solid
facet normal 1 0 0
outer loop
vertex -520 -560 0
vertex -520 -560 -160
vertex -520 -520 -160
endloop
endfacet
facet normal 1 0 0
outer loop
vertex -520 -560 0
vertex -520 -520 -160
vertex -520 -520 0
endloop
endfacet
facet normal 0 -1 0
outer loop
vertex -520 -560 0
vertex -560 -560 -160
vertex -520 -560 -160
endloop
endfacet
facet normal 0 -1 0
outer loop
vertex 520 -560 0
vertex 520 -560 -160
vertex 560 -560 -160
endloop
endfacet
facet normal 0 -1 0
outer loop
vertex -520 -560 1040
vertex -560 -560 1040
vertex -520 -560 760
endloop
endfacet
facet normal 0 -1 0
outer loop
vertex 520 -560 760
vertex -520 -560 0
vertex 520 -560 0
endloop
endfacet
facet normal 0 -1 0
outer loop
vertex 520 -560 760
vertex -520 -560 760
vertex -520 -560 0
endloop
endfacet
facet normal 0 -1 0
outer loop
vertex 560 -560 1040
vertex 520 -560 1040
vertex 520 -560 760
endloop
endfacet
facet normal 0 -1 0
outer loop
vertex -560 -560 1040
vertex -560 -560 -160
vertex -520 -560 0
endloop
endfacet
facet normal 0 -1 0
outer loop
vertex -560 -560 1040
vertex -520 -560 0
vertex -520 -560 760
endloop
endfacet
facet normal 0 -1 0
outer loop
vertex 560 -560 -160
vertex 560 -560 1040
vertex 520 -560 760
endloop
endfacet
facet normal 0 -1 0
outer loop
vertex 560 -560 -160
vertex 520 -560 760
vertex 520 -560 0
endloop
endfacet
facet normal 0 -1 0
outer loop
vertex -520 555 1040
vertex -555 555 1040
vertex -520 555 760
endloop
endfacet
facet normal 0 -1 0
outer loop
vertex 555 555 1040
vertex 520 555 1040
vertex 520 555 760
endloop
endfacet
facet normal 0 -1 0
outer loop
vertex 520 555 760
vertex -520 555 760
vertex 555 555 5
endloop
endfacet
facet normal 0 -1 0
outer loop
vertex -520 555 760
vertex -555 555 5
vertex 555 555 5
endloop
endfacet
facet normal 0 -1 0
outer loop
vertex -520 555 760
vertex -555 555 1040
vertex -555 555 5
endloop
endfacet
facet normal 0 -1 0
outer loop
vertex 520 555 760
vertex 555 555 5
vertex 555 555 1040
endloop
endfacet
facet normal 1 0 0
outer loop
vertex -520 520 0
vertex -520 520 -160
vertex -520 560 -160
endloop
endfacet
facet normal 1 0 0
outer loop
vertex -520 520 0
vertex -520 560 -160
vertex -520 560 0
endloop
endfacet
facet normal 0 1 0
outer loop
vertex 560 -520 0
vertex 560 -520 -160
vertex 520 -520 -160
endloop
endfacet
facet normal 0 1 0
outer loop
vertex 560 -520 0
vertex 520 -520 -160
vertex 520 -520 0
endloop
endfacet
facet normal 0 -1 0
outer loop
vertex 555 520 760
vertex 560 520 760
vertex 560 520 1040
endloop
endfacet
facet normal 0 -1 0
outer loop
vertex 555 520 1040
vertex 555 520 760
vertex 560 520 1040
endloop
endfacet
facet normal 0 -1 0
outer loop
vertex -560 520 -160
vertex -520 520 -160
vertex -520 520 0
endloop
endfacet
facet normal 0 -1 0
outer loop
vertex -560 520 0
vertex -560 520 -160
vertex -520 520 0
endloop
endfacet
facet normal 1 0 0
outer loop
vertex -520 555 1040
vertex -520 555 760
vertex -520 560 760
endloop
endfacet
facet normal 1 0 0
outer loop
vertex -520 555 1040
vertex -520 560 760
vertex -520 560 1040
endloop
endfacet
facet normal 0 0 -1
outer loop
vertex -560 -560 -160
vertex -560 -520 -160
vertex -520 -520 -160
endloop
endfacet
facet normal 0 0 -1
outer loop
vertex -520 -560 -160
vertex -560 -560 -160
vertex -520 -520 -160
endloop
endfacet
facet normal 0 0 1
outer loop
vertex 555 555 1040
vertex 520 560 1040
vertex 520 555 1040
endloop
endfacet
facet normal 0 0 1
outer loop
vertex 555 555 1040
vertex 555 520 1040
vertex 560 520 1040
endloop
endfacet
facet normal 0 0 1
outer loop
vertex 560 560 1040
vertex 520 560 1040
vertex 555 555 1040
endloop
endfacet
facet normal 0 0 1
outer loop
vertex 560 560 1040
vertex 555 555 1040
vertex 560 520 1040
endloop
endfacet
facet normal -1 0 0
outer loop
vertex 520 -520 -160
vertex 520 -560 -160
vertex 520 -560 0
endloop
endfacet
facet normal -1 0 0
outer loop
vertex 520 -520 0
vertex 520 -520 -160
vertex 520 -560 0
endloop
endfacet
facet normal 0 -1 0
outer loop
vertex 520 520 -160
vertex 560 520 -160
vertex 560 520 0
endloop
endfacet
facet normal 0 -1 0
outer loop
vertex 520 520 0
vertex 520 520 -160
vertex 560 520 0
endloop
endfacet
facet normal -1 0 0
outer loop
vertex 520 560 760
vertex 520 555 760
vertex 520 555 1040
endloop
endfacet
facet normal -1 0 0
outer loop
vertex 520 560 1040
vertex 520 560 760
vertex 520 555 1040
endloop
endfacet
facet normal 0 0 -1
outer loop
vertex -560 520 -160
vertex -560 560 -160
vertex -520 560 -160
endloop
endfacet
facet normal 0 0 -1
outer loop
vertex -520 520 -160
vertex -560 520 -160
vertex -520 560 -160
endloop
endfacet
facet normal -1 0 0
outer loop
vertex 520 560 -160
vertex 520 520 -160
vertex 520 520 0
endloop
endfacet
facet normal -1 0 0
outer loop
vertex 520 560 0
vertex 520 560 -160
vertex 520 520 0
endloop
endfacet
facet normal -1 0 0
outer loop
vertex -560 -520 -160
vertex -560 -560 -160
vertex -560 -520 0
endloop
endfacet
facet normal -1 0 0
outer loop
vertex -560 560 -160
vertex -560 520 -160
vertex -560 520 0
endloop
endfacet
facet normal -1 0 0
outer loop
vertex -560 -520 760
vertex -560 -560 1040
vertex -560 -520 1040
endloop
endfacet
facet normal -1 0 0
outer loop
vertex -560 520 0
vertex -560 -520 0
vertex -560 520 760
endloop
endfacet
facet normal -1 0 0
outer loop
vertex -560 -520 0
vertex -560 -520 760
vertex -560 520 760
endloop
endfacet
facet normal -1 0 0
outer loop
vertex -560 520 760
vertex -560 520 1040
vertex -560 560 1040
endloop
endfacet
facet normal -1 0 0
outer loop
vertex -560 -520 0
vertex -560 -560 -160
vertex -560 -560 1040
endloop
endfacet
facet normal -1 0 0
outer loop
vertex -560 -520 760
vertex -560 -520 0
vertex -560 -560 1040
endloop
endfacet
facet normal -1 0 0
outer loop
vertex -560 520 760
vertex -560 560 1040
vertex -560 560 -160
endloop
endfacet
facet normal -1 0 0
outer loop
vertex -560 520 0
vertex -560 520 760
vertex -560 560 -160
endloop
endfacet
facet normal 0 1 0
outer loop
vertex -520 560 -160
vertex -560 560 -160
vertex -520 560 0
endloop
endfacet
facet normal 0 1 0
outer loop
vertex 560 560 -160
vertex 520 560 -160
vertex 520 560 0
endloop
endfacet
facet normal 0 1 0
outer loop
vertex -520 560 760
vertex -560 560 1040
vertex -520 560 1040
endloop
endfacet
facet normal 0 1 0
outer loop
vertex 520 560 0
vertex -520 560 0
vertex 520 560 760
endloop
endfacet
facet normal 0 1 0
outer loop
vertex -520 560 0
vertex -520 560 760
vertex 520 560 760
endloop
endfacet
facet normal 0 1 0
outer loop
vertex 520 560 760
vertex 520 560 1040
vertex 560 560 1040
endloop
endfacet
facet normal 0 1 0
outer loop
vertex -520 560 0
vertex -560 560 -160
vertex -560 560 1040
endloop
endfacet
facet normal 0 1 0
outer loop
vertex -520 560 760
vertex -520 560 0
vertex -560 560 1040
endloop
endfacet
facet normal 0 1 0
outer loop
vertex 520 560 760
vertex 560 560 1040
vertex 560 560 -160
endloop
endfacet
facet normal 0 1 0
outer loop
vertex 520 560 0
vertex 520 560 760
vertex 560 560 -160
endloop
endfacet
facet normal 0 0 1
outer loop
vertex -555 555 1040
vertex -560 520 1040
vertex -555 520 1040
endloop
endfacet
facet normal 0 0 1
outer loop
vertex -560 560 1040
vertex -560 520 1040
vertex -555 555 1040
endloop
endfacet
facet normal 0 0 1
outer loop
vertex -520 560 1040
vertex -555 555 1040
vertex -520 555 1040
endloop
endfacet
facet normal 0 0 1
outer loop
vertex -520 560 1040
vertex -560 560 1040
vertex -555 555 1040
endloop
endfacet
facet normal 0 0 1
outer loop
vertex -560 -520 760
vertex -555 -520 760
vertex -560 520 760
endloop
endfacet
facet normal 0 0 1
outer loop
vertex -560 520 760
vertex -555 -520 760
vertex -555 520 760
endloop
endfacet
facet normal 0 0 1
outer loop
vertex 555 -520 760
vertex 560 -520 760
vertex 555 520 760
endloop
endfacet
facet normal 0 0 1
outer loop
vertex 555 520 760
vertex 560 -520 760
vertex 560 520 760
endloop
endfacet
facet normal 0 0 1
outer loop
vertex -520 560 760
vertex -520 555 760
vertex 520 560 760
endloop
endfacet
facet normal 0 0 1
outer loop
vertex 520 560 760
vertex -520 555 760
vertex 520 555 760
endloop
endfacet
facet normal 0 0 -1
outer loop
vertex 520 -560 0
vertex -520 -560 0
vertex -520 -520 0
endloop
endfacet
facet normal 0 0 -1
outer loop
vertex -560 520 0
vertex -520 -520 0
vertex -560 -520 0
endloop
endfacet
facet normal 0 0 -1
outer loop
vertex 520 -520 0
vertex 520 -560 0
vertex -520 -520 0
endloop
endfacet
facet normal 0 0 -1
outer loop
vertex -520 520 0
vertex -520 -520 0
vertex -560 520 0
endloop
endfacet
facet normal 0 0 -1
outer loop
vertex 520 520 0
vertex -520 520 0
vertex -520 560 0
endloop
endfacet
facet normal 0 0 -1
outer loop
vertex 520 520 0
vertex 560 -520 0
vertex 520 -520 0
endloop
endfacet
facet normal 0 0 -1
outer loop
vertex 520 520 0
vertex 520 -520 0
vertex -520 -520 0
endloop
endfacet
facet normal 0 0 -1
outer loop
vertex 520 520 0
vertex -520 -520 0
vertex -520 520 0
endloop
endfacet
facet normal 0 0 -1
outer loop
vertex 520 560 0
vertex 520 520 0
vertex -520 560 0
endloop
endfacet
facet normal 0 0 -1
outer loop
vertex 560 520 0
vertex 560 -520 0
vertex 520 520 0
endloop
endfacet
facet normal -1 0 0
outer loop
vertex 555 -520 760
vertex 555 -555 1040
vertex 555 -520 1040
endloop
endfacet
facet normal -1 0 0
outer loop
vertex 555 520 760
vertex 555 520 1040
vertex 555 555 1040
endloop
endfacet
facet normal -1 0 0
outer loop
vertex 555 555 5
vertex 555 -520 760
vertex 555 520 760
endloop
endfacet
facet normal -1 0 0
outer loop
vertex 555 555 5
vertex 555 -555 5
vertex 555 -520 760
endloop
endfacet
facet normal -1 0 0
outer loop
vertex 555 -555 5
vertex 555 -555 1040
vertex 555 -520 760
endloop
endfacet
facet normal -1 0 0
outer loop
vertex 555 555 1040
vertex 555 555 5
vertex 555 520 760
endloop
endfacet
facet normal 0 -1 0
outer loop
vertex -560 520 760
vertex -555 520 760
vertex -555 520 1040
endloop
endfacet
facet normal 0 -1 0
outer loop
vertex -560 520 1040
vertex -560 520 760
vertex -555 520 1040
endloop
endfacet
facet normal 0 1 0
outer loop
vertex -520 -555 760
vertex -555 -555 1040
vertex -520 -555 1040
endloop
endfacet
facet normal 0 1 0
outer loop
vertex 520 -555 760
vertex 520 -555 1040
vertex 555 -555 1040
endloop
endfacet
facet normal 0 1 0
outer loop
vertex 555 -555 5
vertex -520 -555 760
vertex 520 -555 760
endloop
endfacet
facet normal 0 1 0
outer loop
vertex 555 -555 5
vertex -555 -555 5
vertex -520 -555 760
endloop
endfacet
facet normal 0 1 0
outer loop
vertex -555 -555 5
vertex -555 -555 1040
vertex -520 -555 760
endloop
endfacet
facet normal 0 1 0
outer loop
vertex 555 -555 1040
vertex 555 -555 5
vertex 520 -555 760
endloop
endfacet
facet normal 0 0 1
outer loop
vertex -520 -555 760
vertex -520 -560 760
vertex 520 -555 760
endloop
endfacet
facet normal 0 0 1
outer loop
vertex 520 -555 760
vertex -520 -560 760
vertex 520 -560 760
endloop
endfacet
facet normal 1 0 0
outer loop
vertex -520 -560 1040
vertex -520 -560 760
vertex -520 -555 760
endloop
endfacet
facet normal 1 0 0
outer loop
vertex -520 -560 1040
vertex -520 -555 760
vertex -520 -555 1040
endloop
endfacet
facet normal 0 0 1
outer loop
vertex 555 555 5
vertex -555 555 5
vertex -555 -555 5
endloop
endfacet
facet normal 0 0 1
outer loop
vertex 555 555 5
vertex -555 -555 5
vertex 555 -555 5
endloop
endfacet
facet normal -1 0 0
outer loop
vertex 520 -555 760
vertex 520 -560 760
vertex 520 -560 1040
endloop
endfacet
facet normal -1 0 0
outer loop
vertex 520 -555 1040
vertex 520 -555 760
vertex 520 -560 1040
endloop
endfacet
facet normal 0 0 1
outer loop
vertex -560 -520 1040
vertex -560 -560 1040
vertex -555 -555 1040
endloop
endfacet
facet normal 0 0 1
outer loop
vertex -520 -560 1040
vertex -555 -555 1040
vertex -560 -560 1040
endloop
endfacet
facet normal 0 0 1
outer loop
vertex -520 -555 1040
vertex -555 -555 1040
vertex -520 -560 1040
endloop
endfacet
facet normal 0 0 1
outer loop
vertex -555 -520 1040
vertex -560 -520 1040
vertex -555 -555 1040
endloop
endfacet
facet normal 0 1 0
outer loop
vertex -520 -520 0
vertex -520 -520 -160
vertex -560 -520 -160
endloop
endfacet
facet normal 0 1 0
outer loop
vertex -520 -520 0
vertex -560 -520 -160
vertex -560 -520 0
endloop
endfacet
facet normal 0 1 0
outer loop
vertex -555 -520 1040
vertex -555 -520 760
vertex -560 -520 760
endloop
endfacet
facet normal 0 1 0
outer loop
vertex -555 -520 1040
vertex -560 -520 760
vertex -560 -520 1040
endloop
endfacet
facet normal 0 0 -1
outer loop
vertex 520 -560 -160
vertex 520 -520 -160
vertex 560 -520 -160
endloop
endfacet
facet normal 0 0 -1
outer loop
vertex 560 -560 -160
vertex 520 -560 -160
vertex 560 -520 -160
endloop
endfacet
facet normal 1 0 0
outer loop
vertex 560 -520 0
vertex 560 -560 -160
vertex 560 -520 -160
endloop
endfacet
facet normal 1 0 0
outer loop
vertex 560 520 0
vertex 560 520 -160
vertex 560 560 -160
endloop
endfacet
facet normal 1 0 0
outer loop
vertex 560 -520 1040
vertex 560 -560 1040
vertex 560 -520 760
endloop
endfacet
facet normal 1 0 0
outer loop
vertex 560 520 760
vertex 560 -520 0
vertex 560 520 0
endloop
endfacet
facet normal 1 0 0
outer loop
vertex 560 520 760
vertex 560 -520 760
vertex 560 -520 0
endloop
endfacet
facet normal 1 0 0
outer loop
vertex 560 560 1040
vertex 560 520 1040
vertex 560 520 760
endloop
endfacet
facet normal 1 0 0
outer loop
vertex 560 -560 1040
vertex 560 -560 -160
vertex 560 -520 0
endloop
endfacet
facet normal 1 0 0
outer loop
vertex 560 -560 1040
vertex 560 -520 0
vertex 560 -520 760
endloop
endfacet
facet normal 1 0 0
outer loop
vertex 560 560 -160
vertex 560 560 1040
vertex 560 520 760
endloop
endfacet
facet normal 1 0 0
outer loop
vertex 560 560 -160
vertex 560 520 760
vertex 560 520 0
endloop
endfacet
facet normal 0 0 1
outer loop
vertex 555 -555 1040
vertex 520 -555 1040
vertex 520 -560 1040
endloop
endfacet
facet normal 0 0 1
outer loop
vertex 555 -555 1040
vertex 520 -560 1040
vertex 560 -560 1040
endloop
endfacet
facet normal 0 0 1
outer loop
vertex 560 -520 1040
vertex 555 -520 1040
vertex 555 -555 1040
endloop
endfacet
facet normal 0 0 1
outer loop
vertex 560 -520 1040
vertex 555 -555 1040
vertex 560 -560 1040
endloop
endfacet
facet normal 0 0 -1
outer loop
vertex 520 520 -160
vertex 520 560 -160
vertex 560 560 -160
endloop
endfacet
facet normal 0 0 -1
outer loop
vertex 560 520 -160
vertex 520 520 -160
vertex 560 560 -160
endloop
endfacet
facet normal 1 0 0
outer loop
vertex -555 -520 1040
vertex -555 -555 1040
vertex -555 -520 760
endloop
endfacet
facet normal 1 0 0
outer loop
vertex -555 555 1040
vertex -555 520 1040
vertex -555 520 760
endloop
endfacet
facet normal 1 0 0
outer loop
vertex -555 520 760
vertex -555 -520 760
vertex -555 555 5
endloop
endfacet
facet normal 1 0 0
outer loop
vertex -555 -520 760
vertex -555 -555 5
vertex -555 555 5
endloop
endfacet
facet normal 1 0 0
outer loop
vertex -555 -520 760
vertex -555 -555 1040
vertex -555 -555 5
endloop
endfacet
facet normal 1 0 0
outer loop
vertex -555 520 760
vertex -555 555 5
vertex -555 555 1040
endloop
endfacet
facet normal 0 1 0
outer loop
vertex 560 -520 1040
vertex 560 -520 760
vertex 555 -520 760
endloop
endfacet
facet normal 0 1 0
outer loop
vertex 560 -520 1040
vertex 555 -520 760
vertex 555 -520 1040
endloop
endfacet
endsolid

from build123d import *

# Parameters (mm, degrees)
F0_W     = 1120
F0_H     = 1120
F1_DEPTH = 1040
F2_T     = -5
F3_DEPTH = 160
F4_W     = 1040
F4_H     = 280
F4_H_2   = 160
F5_DEPTH = 1120.001
F6_W     = 1040
F6_H     = 280
F6_H_2   = 160
F7_DEPTH = 1120.001


with BuildPart() as f1:
    # F0 (on Top) → F1 (new body)
    with BuildSketch(Plane.XY):
        Rectangle(F0_W, F0_H)
    extrude(amount=F1_DEPTH)

    # F2
    f2_openings = [f1.faces().sort_by_distance(p)[0] for p in [
        (0, 0, 1040),
    ]]
    offset(amount=F2_T, openings=f2_openings)

    # F0 (on Top) → F3 (join)
    with BuildSketch(Plane.XY):
        Rectangle(F0_W, F0_H)
    extrude(amount=-F3_DEPTH)

    # F4 (on face) → F5 (cut, through all)
    with BuildSketch(Plane.YZ.offset(560)):
        with Locations((0, 900)):
            Rectangle(F4_W, F4_H)
        with Locations((0, -80)):
            Rectangle(F4_W, F4_H_2)
    extrude(amount=-F5_DEPTH, mode=Mode.SUBTRACT)

    # F6 (on face) → F7 (cut, through all)
    with BuildSketch(Plane.XZ.offset(560)):
        with Locations((0, 900)):
            Rectangle(F6_W, F6_H)
        with Locations((0, -80)):
            Rectangle(F6_W, F6_H_2)
    extrude(amount=-F7_DEPTH, mode=Mode.SUBTRACT)


solid = f1.part
